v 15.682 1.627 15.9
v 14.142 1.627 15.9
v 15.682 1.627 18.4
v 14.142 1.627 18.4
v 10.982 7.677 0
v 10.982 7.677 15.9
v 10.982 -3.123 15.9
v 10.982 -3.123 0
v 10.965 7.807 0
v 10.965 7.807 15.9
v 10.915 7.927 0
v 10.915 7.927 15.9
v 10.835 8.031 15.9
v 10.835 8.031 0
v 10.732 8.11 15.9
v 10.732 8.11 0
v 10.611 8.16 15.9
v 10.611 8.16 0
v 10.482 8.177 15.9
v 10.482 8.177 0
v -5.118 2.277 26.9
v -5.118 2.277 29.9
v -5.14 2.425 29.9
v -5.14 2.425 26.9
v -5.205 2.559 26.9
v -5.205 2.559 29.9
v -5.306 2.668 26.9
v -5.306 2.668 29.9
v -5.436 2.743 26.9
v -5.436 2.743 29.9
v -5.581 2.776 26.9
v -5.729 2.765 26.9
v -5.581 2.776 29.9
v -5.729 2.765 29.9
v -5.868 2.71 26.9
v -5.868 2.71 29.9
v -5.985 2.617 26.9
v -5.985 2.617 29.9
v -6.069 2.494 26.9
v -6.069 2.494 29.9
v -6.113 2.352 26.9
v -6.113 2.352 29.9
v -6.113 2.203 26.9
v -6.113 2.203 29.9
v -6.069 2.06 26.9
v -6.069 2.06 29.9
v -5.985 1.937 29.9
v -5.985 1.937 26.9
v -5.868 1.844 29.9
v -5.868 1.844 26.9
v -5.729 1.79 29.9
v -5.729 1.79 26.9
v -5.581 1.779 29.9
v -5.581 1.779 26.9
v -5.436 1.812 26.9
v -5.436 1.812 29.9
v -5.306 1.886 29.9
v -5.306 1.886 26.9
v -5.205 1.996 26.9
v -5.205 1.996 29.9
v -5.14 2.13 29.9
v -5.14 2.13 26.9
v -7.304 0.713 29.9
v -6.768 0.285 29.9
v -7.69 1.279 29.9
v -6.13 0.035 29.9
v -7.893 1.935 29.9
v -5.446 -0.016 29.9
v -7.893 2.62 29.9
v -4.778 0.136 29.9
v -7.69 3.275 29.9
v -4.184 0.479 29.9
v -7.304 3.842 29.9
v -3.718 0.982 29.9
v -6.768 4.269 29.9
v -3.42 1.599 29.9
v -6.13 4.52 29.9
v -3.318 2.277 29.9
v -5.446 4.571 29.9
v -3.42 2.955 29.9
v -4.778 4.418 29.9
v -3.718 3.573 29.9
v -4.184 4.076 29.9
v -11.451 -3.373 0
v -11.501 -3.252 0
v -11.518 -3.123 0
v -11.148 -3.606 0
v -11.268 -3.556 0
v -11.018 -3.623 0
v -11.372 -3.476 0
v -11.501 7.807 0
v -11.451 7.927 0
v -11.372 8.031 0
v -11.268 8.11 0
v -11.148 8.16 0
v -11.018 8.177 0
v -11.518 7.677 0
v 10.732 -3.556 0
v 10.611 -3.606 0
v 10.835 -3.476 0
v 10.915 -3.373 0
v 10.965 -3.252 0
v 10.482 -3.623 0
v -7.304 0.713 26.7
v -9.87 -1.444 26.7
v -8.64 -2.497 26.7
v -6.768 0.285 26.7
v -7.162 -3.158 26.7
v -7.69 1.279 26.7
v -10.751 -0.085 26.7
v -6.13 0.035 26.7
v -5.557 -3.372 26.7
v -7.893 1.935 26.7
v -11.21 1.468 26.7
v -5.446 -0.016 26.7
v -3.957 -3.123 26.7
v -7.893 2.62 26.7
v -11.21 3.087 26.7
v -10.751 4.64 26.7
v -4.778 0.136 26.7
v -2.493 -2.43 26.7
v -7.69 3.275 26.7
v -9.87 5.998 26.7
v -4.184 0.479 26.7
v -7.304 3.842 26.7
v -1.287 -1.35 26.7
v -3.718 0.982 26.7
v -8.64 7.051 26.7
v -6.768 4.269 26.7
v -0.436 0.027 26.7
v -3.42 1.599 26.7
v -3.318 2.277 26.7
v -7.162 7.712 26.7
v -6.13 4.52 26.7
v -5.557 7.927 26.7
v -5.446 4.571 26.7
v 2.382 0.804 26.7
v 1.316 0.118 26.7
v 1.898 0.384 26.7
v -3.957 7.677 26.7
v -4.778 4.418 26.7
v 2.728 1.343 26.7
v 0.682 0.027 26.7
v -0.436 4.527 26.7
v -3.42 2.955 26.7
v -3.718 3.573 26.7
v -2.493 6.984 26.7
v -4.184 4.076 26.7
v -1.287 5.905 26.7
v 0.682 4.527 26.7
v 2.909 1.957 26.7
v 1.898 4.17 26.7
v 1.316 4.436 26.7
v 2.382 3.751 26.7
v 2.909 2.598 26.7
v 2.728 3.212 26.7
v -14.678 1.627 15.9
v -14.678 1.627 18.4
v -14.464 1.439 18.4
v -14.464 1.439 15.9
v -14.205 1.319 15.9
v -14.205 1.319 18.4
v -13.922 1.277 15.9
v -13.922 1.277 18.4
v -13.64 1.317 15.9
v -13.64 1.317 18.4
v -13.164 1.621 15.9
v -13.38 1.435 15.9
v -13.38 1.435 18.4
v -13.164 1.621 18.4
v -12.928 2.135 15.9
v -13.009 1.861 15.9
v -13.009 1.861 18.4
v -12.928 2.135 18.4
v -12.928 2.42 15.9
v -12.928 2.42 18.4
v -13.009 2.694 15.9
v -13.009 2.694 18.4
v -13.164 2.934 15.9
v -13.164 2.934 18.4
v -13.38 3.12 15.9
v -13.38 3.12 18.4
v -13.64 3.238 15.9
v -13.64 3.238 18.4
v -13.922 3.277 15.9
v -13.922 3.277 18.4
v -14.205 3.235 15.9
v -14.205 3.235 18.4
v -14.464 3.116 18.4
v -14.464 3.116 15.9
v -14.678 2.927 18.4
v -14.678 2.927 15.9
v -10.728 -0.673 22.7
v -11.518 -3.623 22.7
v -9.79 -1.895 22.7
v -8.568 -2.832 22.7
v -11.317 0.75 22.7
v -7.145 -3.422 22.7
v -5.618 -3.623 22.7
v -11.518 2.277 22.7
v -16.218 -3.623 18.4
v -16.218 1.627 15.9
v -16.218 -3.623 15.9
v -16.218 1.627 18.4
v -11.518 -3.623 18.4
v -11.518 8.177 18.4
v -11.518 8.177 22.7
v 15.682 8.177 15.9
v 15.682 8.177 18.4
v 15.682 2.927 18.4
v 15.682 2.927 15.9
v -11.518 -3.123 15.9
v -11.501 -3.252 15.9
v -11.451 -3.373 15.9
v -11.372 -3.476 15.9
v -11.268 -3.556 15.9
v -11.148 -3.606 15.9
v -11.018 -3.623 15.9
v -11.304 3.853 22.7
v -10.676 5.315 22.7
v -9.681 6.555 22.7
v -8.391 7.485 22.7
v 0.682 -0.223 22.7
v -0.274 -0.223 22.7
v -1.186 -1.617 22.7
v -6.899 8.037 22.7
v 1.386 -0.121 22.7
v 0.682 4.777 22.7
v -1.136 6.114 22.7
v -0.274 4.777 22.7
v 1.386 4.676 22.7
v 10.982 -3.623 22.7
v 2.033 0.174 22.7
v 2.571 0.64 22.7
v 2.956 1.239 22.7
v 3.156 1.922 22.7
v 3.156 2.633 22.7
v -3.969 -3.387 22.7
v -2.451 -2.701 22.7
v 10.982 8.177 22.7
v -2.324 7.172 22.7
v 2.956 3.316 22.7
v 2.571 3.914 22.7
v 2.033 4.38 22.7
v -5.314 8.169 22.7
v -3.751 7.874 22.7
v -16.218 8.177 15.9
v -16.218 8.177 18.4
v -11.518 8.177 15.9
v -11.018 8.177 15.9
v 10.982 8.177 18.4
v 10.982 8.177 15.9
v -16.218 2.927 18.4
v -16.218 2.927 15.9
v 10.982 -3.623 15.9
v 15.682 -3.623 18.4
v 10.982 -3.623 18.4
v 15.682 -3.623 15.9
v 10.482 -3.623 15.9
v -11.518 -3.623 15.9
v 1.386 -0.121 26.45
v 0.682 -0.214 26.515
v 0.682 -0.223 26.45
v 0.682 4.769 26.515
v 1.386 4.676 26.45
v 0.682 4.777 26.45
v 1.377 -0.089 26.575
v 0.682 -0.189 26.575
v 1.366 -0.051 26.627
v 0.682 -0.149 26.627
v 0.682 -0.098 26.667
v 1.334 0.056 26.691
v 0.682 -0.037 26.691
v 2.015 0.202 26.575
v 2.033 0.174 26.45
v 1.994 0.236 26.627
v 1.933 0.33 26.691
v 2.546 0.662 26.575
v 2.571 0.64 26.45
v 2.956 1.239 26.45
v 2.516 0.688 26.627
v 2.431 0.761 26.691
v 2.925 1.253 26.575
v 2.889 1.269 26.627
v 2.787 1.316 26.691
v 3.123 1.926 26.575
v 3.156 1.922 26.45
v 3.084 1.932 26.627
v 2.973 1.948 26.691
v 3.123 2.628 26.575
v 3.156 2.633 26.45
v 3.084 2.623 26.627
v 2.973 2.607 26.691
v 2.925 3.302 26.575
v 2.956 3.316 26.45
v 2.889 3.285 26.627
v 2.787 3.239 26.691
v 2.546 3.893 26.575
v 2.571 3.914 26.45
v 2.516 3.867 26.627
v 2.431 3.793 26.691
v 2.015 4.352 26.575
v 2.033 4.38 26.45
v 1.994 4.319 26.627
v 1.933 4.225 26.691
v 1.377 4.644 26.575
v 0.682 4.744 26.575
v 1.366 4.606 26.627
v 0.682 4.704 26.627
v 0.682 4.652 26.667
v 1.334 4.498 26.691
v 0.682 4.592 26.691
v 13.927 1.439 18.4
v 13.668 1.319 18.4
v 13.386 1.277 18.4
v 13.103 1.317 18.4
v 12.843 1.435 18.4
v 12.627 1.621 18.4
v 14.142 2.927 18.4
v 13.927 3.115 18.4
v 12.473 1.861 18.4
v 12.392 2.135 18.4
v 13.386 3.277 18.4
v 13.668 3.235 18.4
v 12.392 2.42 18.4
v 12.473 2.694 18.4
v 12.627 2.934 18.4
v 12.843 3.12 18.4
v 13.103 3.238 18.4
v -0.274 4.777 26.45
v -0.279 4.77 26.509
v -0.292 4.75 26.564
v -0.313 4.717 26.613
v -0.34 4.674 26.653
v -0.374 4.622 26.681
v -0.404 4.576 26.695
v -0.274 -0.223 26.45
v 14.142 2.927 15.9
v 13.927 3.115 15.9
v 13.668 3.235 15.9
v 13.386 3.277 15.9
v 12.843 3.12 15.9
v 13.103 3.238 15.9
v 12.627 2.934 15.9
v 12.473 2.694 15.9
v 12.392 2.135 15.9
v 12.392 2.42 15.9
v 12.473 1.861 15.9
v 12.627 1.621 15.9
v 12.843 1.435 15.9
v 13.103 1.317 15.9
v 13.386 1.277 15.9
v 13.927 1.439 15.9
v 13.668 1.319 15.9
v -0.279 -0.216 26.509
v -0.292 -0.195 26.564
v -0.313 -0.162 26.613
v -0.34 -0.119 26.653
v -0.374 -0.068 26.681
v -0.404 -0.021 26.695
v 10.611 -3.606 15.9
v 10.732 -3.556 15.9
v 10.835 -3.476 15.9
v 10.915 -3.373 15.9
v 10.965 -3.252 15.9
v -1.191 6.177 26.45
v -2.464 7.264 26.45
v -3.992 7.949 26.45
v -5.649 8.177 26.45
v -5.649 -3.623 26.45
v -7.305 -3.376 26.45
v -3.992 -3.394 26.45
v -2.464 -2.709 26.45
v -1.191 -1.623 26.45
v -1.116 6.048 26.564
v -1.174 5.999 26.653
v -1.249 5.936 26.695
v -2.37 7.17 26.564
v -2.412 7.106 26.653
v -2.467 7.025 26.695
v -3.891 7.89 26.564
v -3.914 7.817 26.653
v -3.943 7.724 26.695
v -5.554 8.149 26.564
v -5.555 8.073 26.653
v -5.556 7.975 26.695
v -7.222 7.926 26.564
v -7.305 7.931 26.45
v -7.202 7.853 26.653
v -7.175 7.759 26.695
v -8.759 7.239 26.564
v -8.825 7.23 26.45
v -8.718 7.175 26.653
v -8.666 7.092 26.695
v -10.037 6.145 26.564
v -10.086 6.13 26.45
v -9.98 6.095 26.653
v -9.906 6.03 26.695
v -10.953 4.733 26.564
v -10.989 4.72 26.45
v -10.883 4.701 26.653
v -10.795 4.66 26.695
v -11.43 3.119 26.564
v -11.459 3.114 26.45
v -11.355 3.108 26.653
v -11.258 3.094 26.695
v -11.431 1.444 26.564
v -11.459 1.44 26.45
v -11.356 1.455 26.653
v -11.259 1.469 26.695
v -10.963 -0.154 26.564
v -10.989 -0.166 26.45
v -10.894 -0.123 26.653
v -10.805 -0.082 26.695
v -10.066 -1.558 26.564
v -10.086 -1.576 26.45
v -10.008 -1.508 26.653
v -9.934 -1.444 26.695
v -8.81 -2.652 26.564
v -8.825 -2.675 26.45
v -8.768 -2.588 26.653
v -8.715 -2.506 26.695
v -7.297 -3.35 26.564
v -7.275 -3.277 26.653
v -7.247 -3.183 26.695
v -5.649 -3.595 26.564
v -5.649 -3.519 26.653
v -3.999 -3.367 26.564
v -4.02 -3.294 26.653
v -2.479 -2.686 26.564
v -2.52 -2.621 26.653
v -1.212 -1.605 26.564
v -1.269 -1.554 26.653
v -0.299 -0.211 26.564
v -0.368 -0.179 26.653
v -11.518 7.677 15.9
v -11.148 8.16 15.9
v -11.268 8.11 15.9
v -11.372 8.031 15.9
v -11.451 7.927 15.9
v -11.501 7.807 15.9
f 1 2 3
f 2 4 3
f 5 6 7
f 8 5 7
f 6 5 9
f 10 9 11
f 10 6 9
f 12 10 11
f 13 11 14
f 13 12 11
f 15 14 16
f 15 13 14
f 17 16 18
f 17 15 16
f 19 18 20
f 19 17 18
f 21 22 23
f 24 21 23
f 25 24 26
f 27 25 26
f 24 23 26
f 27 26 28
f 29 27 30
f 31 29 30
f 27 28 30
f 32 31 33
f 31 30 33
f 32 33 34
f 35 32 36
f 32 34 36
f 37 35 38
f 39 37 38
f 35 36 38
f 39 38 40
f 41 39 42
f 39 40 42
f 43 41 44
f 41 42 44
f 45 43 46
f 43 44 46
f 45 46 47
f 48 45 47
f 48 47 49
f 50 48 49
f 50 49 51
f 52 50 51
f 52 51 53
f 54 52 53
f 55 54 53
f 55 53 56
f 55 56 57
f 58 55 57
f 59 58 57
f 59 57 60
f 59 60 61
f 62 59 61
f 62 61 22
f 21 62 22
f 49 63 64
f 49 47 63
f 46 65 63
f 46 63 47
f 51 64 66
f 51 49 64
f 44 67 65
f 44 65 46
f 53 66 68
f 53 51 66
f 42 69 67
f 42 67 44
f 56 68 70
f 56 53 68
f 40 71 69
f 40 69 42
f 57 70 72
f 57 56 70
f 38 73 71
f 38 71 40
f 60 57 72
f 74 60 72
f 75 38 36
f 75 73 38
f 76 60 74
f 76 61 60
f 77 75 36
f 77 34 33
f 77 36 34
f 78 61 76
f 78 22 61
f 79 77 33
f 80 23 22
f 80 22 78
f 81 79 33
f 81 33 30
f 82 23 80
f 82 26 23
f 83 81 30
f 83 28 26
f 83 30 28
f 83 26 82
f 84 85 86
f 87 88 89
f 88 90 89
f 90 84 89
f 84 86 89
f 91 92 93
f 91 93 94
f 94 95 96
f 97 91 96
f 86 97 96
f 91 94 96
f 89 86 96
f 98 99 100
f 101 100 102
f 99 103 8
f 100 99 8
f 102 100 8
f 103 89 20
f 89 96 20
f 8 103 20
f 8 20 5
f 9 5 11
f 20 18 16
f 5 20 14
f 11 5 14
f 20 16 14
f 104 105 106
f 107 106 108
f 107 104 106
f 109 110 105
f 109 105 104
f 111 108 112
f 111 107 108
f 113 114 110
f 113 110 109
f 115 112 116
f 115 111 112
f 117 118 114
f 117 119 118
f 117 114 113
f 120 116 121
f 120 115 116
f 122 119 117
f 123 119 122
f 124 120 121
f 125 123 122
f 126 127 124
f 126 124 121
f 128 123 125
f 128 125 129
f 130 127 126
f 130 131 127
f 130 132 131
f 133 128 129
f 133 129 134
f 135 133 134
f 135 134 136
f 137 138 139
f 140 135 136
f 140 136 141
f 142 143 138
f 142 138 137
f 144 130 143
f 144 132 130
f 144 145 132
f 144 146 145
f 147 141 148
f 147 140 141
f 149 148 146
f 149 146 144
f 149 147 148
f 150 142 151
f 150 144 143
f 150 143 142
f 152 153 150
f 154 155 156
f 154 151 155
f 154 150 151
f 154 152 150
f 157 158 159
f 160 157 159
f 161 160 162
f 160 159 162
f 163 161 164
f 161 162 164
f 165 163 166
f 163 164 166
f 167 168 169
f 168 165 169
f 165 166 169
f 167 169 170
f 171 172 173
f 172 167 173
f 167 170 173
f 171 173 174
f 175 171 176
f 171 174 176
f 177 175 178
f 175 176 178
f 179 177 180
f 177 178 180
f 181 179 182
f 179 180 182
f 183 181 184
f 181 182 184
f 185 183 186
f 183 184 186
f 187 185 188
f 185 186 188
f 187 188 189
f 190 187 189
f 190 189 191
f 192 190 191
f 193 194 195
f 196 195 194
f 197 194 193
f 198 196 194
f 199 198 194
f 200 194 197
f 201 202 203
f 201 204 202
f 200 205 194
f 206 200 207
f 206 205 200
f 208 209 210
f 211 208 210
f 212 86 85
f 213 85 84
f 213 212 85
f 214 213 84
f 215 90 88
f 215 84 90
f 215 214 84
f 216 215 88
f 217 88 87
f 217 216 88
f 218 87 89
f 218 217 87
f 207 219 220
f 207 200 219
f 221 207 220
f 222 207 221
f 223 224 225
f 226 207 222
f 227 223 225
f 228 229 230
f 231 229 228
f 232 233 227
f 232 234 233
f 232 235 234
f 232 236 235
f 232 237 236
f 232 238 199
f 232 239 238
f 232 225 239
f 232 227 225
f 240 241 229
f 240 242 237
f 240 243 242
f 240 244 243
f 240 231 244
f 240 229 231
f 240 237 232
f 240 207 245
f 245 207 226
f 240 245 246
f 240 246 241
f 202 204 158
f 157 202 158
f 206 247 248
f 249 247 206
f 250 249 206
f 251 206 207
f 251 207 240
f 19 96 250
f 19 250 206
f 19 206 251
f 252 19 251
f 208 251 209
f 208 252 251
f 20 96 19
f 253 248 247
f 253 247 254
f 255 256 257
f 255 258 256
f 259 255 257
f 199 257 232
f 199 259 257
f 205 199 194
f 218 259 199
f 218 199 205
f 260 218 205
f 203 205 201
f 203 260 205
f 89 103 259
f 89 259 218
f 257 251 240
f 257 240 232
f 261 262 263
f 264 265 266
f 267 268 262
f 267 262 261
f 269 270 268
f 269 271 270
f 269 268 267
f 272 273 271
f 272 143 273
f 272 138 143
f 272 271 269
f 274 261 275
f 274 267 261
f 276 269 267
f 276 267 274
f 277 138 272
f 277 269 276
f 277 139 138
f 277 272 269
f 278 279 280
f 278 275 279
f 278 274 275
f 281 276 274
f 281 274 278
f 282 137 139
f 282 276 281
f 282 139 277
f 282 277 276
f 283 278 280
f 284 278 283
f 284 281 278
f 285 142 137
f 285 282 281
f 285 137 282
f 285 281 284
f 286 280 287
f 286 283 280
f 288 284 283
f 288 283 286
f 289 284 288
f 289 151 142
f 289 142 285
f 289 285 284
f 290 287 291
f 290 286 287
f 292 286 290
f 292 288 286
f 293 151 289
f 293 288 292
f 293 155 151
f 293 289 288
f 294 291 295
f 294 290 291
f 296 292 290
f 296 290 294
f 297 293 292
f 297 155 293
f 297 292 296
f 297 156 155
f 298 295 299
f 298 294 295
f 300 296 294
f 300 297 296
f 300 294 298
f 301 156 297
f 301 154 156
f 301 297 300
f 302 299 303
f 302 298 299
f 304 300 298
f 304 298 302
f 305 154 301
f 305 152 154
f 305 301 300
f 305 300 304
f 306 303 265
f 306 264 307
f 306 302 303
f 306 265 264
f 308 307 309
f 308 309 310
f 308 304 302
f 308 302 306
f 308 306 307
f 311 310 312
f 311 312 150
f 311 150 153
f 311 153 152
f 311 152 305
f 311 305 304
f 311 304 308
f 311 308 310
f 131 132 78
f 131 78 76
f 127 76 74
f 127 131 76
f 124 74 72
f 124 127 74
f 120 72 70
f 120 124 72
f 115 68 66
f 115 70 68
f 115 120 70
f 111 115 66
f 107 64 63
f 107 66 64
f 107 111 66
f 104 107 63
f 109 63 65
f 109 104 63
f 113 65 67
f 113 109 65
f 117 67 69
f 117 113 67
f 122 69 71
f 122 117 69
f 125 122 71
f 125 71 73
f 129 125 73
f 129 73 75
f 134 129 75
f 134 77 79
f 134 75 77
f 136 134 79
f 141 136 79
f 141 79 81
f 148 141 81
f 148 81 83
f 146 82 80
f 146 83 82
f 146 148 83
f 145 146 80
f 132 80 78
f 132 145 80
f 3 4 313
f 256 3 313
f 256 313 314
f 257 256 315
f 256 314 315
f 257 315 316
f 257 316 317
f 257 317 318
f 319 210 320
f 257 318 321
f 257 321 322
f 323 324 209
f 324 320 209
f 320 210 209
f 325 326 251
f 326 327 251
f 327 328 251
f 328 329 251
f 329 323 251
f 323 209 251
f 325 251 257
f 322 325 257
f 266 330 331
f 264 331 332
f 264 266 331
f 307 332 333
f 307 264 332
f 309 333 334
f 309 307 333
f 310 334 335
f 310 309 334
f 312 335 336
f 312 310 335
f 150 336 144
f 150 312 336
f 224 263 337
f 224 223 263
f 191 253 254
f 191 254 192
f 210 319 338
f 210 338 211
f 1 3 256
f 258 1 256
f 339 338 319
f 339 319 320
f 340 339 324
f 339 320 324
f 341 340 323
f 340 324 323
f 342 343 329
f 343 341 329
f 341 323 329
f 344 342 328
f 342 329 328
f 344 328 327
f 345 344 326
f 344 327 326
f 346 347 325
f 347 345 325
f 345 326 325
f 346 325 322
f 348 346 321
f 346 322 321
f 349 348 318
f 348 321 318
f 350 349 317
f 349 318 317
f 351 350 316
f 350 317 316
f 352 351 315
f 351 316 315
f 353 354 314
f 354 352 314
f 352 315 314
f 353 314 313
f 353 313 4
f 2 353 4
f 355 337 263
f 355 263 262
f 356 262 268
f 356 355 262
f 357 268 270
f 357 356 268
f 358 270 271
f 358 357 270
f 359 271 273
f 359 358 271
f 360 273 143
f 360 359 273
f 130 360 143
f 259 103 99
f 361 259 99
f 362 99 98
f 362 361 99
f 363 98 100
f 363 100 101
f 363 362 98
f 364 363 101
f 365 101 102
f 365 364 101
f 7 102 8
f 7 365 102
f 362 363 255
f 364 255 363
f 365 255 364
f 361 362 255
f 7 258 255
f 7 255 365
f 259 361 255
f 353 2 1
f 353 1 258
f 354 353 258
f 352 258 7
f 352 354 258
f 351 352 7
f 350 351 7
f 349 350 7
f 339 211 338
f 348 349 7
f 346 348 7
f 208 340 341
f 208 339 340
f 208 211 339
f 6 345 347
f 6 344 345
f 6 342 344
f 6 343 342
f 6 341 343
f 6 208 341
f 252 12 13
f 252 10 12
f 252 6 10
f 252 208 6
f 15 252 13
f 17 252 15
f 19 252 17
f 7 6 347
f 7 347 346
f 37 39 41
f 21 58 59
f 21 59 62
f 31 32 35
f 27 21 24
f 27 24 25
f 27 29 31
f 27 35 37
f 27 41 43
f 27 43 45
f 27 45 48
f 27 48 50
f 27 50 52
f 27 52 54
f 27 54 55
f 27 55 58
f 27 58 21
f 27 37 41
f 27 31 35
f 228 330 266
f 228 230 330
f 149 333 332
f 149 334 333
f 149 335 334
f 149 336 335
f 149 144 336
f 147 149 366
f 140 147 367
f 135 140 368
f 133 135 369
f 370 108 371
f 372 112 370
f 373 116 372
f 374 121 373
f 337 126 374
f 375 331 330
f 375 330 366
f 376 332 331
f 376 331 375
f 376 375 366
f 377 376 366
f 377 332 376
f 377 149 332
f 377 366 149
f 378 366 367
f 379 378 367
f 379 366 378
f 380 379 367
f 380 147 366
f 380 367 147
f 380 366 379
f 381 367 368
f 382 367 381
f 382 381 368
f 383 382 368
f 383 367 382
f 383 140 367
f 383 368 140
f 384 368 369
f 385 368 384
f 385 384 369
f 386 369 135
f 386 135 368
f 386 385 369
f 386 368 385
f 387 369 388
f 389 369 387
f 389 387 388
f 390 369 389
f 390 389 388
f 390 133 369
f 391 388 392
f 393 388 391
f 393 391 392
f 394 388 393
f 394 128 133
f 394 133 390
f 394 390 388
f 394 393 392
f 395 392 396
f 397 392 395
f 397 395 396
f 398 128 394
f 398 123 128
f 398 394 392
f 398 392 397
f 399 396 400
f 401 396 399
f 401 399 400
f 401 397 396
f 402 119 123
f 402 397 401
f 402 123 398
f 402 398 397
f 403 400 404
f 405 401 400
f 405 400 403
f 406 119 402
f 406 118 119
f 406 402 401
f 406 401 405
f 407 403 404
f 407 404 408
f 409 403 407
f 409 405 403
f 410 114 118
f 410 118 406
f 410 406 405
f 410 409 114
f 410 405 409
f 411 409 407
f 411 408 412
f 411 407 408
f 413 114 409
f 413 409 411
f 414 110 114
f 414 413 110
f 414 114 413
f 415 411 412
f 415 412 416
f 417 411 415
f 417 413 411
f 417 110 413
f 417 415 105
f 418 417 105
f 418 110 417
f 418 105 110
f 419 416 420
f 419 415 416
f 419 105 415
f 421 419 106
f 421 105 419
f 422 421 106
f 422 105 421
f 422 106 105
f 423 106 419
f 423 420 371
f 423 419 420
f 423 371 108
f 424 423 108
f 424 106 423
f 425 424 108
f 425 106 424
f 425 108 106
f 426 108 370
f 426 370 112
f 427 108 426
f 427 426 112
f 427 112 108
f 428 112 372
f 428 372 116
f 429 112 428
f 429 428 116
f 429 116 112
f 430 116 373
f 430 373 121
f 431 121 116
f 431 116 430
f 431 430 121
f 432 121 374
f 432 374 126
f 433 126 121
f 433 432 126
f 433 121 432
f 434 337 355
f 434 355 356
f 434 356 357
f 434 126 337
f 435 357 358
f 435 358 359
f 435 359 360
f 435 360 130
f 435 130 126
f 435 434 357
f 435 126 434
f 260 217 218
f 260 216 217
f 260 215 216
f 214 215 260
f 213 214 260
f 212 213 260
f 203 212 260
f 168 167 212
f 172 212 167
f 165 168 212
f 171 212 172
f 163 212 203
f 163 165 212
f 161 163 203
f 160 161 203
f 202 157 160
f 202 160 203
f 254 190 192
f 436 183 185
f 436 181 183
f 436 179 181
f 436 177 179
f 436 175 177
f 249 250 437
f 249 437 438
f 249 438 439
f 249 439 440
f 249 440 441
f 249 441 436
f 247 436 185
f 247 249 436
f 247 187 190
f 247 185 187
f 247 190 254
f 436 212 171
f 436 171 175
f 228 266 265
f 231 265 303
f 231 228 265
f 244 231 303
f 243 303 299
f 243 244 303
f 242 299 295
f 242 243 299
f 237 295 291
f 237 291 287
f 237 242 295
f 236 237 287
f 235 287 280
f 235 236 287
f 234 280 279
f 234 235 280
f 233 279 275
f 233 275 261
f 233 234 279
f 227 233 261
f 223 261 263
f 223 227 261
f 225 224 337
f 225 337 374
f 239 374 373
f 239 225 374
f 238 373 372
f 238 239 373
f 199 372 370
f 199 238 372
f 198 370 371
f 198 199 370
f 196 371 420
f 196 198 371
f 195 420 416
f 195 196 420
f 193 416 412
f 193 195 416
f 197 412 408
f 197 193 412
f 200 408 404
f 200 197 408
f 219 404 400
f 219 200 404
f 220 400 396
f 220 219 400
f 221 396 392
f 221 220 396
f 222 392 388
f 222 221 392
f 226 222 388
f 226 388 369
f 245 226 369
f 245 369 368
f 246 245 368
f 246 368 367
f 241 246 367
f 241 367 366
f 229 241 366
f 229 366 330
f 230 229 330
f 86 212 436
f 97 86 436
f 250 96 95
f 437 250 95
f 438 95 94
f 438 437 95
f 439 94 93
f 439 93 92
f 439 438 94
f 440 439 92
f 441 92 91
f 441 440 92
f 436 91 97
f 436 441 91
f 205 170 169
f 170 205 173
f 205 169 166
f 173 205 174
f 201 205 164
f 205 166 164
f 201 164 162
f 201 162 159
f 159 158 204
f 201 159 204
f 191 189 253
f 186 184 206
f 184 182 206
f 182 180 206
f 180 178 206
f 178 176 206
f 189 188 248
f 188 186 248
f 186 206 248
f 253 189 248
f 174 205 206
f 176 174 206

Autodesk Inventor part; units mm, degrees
ref_plane "YZ Plane" through (0, 0, 0) normal (1, 0, 0) x (0, 1, 0)
ref_plane "XZ Plane" through (0, 0, 0) normal (0, 1, 0) x (-1, 0, 0)
sketch "Sketch1" plane through (0, 0, 0) normal (0, 0, 1) x (1, 0, 0)
  line L0 (-11.5182, 8.1773) -> (10.9818, 8.1773)
  line L1 (10.9818, 8.1773) -> (10.9818, -3.6227)
  line L2 (10.9818, -3.6227) -> (-11.5182, -3.6227)
  line L3 (-11.5182, -3.6227) -> (-11.5182, 8.1773)
  point P0 (0, 0)
  dimension "d0" = 22.5
  dimension "d1" = 11.8
extrude "Extrusion1" add sketch "Sketch1" along normal blind 22.7
sketch "Sketch2" plane through (0, 0, 22.7) normal (0, 0, 1) x (1, 0, 0)
  arc A0 (-0.2741, 4.7773) -> (-0.2741, -0.2227) centre (-5.6182, 2.2773) ccw
  line L0 (-11.5182, 8.1773) -> (-11.5182, -3.6227) projected
  line L1 (-11.5182, -3.6227) -> (10.9818, -3.6227) projected
  line L2 (-0.2741, 4.7773) -> (0.6818, 4.7773)
  line L3 (0.6818, -0.2227) -> (-0.2741, -0.2227)
  arc A1 (0.6818, -0.2227) -> (0.6818, 4.7773) centre (0.6818, 2.2773) ccw
  line L4 (3.1818, 2.2773) -> (3.1818, 4.4746) construction
  point P0 (0, 0)
  dimension "d4" = 11.8
  dimension "d5" = 5.9
  dimension "d6" = 5
  dimension "d7" = 8.8
  dimension "d8" = 2.5
extrude "Extrusion2" add sketch "Sketch2" along normal blind 4 contours L2 A1 L3 A0
sketch "Sketch3" plane through (0, 0, 26.7) normal (0, 0, 1) x (1, 0, 0)
  line L0 (0.6818, 4.7773) -> (-0.2741, 4.7773) projected
  arc A0 (-0.2741, 4.7773) -> (-0.2741, -0.2227) centre (-5.6182, 2.2773) ccw projected
  line L1 (-0.2741, -0.2227) -> (0.6818, -0.2227) projected
  arc A1 (0.6818, -0.2227) -> (0.6818, 4.7773) centre (0.6818, 2.2773) ccw projected
  circle A2 centre (-5.6182, 2.2773) radius 2.3
  point P0 (0, 0)
  dimension "d11" = 4.6
extrude "Extrusion3" add sketch "Sketch3" along normal blind 3.2 contours A2
ref_plane "Work Plane1" through (0, 0, 18.4) normal (0, 0, -1) x (-1, 0, 0)
sketch "Sketch4" plane through (0, 0, 18.4) normal (0, 0, -1) x (-1, 0, 0)
  line L0 (11.5182, 8.1773) -> (-10.9818, 8.1773) projected
  line L1 (-10.9818, 8.1773) -> (-10.9818, -3.6227) projected
  line L2 (-10.9818, -3.6227) -> (11.5182, -3.6227) projected
  line L3 (11.5182, -3.6227) -> (11.5182, 8.1773) projected
  line L4 (11.5182, 8.1773) -> (16.2182, 8.1773)
  line L5 (16.2182, 8.1773) -> (16.2182, -3.6227)
  line L6 (16.2182, -3.6227) -> (11.5182, -3.6227)
  line L7 (11.5182, -3.6227) -> (11.5182, 8.1773)
  line L8 (-10.9818, 8.1773) -> (-15.6818, 8.1773)
  line L9 (-15.6818, 8.1773) -> (-15.6818, -3.6227)
  line L10 (-15.6818, -3.6227) -> (-10.9818, -3.6227)
  line L11 (-10.9818, -3.6227) -> (-10.9818, 8.1773)
  arc A0 (14.6782, 2.9273) -> (14.6782, 1.6273) centre (13.9182, 2.2773) ccw
  arc A1 (-14.1417, 1.6273) -> (-14.1417, 2.9273) centre (-13.3818, 2.2773) ccw
  line L12 (-14.1417, 2.9273) -> (-15.6818, 2.9273)
  line L13 (-14.1417, 1.6273) -> (-15.6818, 1.6273)
  line L14 (16.2182, 2.9273) -> (14.6782, 2.9273)
  line L15 (16.2182, 1.6273) -> (14.6782, 1.6273)
  point P0 (0, 0)
  dimension "d15" = 4.7
  dimension "d16" = 4.7
  dimension "d17" = 5.9
  dimension "d18" = 5.9
  dimension "d19" = 2
  dimension "d20" = 2
  dimension "d23" = 2.3
  dimension "d24" = 2.3
  dimension "d25" = 1.3
  dimension "d26" = 1.3
  dimension "d27" = 0.65
  dimension "d28" = 0.65
extrude "Extrusion4" add sketch "Sketch4" along normal blind 2.5 contours L4 L5 L14 A0 L15 L6 L3 | L1 L10 L9 L13 A1 L12 L8
sketch "Sketch5" plane through (-11.5182, -3.6227, 0) normal (-1, 0, 0) x (0, 0, 1)
  line L0 (5.7, 7.7) -> (4.5, 7.7)
  line L1 (4.5, 7.7) -> (4.5, 4.1)
  line L2 (4.5, 4.1) -> (5.7, 4.1)
  line L3 (5.7, 4.1) -> (5.7, 7.7)
  line L4 (0, 0) -> (0, 11.8) projected
  line L5 (0, 5.9) -> (2.0483, 5.9) construction
  point P0 (0, 3.6227)
  dimension "d31" = 1.2
  dimension "d32" = 3.6
  dimension "d33" = 4.5
fillet "Fillet1" radius 0.25 4 edges at (-11.5182, 2.2773, 26.7) (0.2038, 4.7773, 26.7) (0.2038, -0.2227, 26.7) (3.1818, 2.2773, 26.7)
sketch "Sketch6" plane through (-11.5182, -3.6227, 0) normal (-1, 0, 0) x (0, 0, 1)
  arc A0 (5.2906, 6.4417) -> (4.8906, 6.4417) centre (5.0906, 6.9) ccw
  line L0 (4.8816, 4.4457) -> (5.2851, 7.2539) construction
  line L1 (5.2906, 6.4417) -> (5.2906, 6.3583)
  line L2 (5.2906, 5.4417) -> (5.2906, 5.3583)
  arc A1 (4.8906, 5.3583) -> (5.2906, 5.3583) centre (5.0906, 4.9) ccw
  arc A2 (5.2906, 5.4417) -> (5.2906, 6.3583) centre (5.0906, 5.9) ccw
  arc A3 (4.8906, 6.3583) -> (4.8906, 5.4417) centre (5.0906, 5.9) ccw
  line L3 (5.2906, 3.9094) -> (5.0683, 6.1222) construction
  line L4 (4.8787, 7.3529) -> (4.8906, 7.2532) construction
  line L5 (4.8906, 5.3583) -> (4.8906, 5.4417)
  line L6 (4.8906, 6.3583) -> (4.8906, 6.4417)
  line L7 (0, 0) -> (0, 11.8) projected
  point P0 (0, 3.6227)
  point P1 (0, 5.9)
  dimension "d39" = 1
  dimension "d40" = 2
  dimension "d42" = 0.4
  dimension "d43" = 0.4
  dimension "d44" = 5.0906
  dimension "d45" = 0.5
  dimension "d46" = 0.5
  dimension "d47" = 0.5
  dimension "d48" = 1
  dimension "d49" = 1
  dimension "d50" = 0.2
  dimension "d51" = 0.2
  dimension "d52" = 0.2
  dimension "d53" = 0.5
  dimension "d54" = 0.2
sketch "Sketch7" plane through (-5.6182, 2.2773, 29.9) normal (0, 0, 1) x (1, 0, 0)
  circle A0 centre (0, 0) radius 0.5
  point P0 (5.6182, -2.2773)
  dimension "d55" = 1
extrude "Extrusion6" cut sketch "Sketch7" against normal blind 3
fillet "Fillet2" radius 0.5 4 edges at (10.9818, 8.1773, 7.95) (-11.5182, 8.1773, 7.95) (-11.5182, -3.6227, 7.95) (10.9818, -3.6227, 7.95)
properties part number "servo motor"
